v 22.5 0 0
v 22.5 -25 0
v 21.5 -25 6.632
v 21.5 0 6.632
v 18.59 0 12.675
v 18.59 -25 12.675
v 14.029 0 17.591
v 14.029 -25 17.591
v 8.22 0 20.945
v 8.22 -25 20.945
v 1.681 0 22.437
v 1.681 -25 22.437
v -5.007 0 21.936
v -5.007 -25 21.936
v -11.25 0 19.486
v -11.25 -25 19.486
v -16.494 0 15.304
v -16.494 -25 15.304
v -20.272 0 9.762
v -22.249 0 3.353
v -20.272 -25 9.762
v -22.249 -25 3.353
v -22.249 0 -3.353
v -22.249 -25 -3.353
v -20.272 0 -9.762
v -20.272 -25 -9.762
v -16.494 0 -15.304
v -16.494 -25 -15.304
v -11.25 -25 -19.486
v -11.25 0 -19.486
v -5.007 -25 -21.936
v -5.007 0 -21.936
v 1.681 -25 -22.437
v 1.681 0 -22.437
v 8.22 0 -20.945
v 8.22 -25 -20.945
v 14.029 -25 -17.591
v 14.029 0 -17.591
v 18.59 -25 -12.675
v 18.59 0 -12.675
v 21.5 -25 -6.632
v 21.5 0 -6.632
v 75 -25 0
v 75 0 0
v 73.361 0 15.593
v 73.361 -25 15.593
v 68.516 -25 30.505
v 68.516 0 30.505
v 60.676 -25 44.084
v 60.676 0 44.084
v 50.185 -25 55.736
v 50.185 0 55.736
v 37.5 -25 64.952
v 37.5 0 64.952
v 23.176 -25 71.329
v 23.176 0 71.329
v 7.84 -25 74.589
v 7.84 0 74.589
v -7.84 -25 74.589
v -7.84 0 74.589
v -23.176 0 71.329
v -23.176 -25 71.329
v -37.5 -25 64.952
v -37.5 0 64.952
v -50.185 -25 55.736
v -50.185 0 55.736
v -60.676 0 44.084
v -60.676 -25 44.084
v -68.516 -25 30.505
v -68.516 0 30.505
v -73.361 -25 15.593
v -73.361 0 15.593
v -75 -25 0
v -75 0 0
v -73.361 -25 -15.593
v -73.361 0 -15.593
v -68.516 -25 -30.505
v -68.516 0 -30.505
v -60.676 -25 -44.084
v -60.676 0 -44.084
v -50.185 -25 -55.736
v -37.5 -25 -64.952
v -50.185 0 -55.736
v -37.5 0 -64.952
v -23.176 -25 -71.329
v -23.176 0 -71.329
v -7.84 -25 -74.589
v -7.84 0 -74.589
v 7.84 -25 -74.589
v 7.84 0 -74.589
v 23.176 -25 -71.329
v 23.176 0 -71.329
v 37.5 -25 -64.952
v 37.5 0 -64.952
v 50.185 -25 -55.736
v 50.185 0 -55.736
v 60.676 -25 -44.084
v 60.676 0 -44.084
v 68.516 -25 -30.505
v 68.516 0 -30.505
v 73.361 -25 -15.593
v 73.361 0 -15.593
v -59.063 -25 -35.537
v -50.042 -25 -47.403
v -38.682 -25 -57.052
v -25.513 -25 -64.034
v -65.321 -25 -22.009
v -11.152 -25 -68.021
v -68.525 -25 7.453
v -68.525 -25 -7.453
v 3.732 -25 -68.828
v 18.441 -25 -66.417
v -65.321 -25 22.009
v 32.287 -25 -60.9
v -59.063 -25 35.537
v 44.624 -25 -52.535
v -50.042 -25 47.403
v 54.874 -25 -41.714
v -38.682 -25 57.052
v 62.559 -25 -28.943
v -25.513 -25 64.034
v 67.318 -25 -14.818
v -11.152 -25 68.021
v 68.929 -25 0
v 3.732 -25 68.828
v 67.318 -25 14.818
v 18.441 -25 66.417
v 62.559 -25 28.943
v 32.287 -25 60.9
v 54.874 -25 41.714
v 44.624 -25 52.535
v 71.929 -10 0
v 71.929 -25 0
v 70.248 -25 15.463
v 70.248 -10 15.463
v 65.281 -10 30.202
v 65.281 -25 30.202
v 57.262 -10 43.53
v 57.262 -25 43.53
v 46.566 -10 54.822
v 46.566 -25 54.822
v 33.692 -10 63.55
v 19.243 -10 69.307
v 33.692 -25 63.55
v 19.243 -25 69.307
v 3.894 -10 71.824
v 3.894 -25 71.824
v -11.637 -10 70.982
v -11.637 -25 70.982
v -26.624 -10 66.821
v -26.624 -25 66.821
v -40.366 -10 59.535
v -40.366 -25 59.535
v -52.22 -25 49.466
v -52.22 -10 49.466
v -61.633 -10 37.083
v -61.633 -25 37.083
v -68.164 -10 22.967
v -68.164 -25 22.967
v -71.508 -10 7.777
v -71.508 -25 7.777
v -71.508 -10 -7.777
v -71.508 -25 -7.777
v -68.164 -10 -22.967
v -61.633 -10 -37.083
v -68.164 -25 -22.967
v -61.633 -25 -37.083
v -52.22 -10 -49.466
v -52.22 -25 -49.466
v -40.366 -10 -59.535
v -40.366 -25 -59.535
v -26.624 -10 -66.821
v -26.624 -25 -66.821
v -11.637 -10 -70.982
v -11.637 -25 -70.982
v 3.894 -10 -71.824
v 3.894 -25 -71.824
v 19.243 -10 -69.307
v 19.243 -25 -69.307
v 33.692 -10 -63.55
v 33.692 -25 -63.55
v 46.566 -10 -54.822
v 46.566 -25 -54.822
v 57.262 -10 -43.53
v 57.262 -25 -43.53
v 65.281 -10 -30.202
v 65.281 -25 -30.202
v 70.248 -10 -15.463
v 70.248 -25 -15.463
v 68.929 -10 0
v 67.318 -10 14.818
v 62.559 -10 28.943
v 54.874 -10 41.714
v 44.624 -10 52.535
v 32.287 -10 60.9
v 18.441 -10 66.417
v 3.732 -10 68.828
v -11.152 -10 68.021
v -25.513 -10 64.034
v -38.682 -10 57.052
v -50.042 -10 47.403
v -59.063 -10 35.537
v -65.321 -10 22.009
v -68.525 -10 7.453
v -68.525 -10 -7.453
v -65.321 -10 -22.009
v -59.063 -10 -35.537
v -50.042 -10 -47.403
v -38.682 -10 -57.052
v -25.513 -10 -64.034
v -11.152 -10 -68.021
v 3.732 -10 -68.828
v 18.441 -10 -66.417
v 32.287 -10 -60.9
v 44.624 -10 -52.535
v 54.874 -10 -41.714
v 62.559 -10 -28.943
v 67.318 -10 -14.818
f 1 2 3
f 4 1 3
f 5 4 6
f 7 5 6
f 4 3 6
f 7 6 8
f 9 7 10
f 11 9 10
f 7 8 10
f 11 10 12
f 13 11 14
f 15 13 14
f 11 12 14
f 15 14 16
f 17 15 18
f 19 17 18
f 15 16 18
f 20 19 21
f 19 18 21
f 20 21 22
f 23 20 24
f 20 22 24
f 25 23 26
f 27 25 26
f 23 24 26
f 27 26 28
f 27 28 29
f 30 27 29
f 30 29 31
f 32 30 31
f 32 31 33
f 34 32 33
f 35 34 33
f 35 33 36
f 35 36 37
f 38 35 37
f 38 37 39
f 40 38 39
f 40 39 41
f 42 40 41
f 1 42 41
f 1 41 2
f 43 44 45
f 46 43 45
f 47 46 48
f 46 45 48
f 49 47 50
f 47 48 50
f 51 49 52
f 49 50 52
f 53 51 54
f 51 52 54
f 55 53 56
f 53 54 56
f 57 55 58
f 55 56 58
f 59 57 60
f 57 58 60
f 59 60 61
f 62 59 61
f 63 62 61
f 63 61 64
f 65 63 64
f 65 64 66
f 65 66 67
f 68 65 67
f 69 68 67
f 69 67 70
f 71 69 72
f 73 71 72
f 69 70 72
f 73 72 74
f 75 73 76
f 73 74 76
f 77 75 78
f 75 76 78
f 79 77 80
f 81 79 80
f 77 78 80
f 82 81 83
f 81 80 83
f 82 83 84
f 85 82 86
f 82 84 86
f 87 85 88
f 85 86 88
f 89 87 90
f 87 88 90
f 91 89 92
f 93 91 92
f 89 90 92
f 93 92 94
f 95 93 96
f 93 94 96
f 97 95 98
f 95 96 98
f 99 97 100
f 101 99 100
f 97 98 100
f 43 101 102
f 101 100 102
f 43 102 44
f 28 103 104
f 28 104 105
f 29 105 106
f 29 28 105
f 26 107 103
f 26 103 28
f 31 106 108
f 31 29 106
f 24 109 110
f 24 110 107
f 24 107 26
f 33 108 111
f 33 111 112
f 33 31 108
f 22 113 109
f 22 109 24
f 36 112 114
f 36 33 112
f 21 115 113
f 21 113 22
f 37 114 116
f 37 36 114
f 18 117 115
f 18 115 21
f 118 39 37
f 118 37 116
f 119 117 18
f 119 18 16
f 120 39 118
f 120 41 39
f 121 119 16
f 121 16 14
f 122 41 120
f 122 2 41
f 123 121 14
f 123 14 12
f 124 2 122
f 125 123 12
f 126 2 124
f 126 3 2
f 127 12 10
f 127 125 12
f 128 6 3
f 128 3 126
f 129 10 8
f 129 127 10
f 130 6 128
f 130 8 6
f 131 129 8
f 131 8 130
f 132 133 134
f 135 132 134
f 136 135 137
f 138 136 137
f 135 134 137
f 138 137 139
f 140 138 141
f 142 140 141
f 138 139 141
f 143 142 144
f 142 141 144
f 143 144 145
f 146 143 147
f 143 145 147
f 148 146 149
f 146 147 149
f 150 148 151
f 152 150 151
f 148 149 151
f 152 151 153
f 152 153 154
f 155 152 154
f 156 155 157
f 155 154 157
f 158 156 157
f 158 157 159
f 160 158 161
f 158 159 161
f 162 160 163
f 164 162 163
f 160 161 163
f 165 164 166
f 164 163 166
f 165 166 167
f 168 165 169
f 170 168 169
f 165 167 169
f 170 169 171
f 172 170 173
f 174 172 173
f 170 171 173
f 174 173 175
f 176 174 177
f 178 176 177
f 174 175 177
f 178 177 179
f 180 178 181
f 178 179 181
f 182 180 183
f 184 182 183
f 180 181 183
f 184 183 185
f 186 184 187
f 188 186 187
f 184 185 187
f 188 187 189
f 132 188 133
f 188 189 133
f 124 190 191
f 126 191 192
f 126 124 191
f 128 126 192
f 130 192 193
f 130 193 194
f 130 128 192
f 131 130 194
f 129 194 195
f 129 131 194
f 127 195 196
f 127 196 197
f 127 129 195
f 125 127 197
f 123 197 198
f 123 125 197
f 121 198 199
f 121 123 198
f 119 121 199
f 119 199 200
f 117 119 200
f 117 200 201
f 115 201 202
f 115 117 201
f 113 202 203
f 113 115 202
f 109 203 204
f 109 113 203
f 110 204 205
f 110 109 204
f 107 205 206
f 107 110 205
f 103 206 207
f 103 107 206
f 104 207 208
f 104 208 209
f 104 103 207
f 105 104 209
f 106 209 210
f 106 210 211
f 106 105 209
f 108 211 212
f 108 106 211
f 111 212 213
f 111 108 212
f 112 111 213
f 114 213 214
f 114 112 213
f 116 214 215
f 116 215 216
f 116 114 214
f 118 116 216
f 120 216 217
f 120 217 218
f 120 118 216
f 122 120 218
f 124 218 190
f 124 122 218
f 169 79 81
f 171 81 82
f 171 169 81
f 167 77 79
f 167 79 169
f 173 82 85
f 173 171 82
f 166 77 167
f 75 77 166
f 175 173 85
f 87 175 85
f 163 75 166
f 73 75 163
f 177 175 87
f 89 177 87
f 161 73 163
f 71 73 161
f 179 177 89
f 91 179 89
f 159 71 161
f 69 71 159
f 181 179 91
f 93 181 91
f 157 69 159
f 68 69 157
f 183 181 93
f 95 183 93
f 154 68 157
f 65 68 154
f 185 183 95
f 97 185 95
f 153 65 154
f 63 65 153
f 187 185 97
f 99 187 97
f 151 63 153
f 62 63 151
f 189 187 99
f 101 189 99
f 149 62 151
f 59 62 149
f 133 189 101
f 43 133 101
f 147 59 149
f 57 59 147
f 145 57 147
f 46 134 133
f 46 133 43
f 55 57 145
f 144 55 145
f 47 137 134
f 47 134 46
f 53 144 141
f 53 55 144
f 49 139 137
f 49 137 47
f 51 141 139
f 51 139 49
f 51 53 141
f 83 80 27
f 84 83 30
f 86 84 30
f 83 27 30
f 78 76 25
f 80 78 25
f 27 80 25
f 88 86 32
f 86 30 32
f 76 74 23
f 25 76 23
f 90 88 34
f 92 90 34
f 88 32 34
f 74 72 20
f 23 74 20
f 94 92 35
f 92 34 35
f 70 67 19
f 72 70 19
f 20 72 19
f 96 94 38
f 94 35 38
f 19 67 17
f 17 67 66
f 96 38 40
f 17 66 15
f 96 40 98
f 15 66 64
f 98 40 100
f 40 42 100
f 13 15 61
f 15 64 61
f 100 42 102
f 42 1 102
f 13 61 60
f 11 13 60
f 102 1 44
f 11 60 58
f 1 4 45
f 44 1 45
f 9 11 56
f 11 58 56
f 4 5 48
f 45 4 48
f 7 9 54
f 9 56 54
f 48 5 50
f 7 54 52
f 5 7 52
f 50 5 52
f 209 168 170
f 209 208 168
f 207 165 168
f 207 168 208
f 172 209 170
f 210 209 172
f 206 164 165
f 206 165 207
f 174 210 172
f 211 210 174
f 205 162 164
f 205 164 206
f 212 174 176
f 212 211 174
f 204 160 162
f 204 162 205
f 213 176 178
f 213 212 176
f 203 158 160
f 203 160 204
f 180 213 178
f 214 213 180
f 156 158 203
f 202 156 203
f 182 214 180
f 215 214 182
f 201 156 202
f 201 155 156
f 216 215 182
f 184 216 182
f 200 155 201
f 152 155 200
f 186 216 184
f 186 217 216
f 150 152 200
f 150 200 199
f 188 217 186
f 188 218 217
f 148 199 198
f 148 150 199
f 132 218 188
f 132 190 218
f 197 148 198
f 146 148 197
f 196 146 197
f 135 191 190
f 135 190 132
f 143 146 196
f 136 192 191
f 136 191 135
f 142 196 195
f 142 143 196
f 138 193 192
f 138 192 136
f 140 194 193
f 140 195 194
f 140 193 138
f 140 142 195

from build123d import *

# Parameters (mm, degrees)
F0_R     = 75
F0_R_2   = 20.666788
F1_DEPTH = 25
F2_R     = 22.5
F3_DEPTH = 25.001
F4_R     = 71.929289
F4_R_2   = 68.929292
F5_DEPTH = 15


with BuildPart() as f1:
    # F0 (on Front) → F1 (new body)
    with BuildSketch(Plane.XZ):
        Circle(F0_R)
        Circle(F0_R_2, mode=Mode.SUBTRACT)
        Circle(F0_R_2)
    extrude(amount=F1_DEPTH)

    # F2 (on face) → F3 (cut, through all)
    with BuildSketch(Plane.XZ.offset(25)):
        Circle(F2_R)
    extrude(amount=-F3_DEPTH, mode=Mode.SUBTRACT)

    # F4 (on face) → F5 (cut)
    with BuildSketch(Plane.XZ.offset(25)):
        Circle(F4_R)
        Circle(F4_R_2, mode=Mode.SUBTRACT)
    extrude(amount=-F5_DEPTH, mode=Mode.SUBTRACT)


solid = f1.part
